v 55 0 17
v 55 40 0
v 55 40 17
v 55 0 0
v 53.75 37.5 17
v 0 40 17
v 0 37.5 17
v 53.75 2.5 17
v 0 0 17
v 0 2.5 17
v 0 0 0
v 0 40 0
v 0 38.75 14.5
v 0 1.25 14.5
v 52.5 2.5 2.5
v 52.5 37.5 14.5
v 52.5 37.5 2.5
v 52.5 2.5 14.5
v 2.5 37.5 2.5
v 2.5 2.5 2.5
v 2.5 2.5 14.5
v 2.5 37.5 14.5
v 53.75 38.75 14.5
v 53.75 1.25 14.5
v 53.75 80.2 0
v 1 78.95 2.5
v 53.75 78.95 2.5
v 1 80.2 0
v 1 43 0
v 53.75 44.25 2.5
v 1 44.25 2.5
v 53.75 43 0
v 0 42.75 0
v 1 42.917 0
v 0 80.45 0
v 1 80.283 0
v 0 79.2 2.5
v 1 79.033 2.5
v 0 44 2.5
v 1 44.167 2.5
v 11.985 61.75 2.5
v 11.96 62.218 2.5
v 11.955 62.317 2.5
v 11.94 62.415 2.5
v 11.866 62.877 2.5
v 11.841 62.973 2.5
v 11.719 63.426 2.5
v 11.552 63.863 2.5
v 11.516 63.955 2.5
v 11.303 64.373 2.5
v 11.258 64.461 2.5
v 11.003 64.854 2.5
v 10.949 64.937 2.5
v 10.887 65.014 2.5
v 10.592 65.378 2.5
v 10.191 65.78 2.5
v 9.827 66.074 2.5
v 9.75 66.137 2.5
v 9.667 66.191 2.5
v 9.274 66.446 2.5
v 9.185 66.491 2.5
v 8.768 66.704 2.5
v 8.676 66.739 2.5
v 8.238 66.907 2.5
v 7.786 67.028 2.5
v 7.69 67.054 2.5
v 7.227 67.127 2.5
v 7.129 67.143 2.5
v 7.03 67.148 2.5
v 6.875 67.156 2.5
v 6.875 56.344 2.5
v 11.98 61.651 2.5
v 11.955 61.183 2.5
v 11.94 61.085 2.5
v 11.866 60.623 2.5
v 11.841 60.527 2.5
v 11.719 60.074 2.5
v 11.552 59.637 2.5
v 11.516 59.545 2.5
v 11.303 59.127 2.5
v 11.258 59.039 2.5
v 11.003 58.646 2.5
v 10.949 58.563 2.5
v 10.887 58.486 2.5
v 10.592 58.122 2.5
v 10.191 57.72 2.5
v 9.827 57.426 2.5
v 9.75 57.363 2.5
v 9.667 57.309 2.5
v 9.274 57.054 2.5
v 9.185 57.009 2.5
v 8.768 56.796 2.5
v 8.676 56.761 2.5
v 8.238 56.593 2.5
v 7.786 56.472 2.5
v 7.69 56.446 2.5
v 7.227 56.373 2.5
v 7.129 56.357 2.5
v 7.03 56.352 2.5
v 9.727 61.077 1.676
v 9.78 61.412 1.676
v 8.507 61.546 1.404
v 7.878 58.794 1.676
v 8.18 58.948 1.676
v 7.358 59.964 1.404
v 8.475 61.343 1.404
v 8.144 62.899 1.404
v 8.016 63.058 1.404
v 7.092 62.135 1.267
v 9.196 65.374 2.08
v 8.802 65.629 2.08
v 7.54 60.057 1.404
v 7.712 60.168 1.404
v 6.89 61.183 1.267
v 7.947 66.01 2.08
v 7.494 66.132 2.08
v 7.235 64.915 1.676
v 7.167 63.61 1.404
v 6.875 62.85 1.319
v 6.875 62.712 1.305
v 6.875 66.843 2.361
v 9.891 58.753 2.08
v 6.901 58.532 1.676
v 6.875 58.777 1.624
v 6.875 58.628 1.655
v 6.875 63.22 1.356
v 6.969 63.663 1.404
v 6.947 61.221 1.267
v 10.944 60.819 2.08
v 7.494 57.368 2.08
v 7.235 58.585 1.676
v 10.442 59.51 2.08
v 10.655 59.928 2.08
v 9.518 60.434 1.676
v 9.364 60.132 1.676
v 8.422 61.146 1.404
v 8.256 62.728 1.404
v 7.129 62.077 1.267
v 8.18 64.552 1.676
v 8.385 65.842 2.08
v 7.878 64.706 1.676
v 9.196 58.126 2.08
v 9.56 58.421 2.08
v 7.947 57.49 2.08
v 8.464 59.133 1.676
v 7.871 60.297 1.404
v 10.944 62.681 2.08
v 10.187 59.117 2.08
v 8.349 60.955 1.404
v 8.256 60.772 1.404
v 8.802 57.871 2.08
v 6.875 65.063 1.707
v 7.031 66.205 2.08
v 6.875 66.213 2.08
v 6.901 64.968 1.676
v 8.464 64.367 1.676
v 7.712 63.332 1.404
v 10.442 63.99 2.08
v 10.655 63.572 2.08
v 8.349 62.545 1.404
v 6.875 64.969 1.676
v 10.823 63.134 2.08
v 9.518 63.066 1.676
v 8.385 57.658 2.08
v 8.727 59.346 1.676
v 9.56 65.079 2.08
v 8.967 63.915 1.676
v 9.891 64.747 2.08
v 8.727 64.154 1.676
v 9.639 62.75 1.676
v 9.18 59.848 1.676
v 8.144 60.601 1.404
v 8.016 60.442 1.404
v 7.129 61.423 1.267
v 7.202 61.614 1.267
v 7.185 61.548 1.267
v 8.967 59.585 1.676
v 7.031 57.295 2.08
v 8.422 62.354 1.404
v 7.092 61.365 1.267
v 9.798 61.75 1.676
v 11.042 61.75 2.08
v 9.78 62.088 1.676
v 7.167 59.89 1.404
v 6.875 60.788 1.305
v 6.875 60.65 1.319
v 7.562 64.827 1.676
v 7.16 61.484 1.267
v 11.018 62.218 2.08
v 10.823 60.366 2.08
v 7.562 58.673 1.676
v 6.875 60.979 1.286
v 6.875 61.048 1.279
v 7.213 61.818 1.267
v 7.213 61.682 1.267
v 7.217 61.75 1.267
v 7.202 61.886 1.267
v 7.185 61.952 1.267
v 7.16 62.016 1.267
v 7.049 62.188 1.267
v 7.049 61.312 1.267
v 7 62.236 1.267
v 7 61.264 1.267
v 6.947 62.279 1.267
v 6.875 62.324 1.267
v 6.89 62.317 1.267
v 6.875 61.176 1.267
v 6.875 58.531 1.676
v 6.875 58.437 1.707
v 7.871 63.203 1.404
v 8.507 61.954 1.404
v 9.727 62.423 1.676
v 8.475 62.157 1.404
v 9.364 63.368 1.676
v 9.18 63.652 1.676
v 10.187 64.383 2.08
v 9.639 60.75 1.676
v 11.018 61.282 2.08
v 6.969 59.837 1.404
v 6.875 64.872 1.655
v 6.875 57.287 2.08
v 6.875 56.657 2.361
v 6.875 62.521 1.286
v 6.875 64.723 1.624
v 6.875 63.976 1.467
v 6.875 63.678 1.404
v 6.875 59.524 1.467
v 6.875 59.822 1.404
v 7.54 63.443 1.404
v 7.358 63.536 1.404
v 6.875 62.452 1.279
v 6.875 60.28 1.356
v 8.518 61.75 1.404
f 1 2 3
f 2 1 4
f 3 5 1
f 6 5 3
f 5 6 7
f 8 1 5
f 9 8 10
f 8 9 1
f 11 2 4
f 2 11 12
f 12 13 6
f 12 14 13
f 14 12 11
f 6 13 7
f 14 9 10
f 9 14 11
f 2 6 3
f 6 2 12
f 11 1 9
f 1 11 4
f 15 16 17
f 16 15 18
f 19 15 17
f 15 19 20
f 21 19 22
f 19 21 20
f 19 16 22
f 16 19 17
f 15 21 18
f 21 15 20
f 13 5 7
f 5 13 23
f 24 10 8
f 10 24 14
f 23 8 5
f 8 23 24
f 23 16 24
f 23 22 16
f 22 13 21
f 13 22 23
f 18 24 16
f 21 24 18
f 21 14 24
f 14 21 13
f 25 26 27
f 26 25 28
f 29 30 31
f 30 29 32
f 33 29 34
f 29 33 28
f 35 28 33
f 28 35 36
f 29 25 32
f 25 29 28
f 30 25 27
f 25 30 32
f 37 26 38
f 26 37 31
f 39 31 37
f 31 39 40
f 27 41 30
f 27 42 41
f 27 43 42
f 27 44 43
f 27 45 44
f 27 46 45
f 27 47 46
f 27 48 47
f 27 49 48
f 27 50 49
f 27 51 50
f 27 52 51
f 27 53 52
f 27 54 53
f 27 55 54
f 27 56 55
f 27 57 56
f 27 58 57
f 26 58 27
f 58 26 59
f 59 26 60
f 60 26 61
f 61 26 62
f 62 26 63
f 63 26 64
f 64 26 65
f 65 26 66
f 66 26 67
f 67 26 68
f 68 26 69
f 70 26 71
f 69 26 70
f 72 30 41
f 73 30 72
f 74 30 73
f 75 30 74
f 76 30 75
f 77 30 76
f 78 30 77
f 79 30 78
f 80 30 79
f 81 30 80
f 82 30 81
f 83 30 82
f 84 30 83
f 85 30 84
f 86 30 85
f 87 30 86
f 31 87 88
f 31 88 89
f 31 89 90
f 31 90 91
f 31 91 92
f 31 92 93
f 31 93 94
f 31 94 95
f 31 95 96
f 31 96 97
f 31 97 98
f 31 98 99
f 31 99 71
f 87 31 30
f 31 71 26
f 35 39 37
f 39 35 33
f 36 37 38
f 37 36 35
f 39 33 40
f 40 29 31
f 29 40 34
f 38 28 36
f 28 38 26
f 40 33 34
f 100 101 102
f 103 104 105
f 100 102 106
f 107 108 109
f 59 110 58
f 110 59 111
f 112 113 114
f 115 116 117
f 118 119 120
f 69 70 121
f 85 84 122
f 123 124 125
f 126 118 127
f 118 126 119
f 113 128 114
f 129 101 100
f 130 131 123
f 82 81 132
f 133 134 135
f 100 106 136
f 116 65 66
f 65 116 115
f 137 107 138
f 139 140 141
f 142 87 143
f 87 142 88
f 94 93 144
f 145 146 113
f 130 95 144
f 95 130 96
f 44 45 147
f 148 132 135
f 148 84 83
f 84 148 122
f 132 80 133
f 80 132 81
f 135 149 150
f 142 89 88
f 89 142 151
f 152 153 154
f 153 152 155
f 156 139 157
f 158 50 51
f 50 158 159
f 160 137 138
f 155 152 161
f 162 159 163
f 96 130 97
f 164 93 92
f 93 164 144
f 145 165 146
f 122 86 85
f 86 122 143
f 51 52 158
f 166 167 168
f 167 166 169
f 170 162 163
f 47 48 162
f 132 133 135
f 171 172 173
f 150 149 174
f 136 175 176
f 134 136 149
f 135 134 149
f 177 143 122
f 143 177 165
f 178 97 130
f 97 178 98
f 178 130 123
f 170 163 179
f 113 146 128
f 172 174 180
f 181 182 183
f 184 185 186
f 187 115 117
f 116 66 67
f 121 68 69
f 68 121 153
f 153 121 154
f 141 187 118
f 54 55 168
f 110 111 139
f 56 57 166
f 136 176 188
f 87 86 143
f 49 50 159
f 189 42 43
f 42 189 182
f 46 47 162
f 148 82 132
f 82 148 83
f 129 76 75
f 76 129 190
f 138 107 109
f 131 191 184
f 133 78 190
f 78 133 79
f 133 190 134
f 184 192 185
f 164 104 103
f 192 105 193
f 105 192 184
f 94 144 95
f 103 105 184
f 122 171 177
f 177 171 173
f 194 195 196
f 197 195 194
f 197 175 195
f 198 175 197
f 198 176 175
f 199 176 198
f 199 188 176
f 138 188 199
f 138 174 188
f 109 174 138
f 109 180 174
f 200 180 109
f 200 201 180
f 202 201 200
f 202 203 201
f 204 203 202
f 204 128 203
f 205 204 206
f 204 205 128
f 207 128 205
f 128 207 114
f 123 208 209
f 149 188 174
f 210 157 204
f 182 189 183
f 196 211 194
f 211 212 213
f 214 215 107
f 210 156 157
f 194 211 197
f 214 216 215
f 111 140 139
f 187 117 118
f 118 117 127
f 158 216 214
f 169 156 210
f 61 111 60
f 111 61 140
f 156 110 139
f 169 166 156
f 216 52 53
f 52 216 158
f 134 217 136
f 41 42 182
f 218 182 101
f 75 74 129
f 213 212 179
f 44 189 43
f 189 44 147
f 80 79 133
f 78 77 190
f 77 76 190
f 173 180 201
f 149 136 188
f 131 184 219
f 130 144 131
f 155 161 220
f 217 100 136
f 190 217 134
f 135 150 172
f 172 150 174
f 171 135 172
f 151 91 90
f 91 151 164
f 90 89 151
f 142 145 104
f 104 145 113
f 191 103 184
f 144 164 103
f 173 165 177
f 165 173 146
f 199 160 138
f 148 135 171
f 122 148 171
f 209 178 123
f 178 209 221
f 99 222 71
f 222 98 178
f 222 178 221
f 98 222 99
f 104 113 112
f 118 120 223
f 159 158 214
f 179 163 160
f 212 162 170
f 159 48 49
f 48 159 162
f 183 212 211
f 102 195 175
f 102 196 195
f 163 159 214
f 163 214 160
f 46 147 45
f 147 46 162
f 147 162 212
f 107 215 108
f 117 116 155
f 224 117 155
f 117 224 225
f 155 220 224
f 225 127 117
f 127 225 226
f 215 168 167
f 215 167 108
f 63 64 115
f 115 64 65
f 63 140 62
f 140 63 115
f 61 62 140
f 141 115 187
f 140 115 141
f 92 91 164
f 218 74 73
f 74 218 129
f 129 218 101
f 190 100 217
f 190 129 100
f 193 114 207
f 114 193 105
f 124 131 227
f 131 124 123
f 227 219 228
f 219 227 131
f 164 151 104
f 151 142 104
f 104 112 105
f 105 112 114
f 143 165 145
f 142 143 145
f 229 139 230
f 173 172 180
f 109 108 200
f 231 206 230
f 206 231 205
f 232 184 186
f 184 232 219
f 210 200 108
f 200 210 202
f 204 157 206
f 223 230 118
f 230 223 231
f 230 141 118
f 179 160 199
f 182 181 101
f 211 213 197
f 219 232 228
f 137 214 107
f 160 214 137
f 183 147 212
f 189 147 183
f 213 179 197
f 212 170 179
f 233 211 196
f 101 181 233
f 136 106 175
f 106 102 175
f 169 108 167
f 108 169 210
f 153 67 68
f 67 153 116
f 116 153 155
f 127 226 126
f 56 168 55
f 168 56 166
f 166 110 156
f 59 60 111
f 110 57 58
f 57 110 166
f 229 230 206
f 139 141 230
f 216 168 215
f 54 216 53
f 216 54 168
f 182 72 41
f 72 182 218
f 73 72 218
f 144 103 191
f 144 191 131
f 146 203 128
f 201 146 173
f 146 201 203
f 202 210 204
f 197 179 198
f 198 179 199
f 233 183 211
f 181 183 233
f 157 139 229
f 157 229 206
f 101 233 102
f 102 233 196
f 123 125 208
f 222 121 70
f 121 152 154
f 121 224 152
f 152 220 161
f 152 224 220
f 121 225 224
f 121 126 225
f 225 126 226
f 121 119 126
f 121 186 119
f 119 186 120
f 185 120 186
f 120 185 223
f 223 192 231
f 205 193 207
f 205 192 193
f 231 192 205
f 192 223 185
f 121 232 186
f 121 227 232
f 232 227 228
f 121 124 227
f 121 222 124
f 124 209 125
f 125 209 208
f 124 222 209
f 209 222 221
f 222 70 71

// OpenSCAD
// Download both files into the same directory and make a copy of this template for each project. Adjust the variables and values as needed to override the defaults in this file as needed. In this way you can replace the `Ultimate_Box_Generator.scad` file with a new version without having to track and restore your changes.

// If you want to use any framework variables in calulations you must import them here. If you want to also change the variable you must use a second line below to do that.
wall=wall;
internal_wall=internal_wall;

// Include the framework. You can change the prefix to load from a shared path.
include    <Ultimate_Box_Generator.scad>;

// At this point you can start to adjust builtin varaibles and create your own. There are also some examples of more complex boxes at the end of the file.


// Parts to render. To do more complex opperations disable these and manually call make_box() and make_lid() instead.
show_box=true;	// Whether or not to render the box
show_lid=true;	// Whether or not to render the lid. To make open boxes with no lid set `show_lid=false` and `lid_type=5`.

// General Settings
//comp_size_deep = 12; // Depth of compartments
//comp_size_x = 50;	 // Size of compartments, X
//comp_size_y = 35;	 // Size of compartments, Y
//wall = 2.5;		    // Width of wall, see `internal_wall` below for alternate inner wall size.
//repeat_x = 1;		// Number of compartments, X
//repeat_y = 1;		// Number of compartments, Y
//tolerance=.15;      // Tolerance around lid.  If it's too tight, increase this. If it's too loose, decrease it.

// Box Rounding
//box_corner_radius=0; // Add a rounding affect to the corners of the box. Anything over `wall` will cause structure and lid problems.
//internal_corner_radius=0; // Add a rounding affect to the inside.
//mesh_corner_radius=0; // Leave a radius around each corner of the mesh. May hep with bridges.
//corner_fn=30;

// Supress individual walls.
//supress_walls_x=[]; // These are the walls running along the X axis. It should be an array of size [repeat_y-1][repeat_x].
//supress_walls_y=[]; // These are the walls running along the Y axis. It should be an array of size [repeat_x-1][repeat_y].
// Example for repeat_x=4, repeat_y=3:
//supress_walls_x=[[1,0,1,1],[0,1,0,1]];
//supress_walls_y=[[1,0,1],[0,1,1],[1,1,1]];
//supress_sides=false; // [X, Y, X, Y] Cutout/supress some sides. this may behave baddly with compartments or mesh.
//supress_sides_radius=wall; // Add a rounding to the cutout.
//supress_sides_offset=0; // 0, wall, [X, Y, Z] adjsut the coutout in all directions. + to grow, - so shrink
//supress_sides_fn=30;

// Mesh Settings
// To make rounded corners and no mesh use any `mesh_type` > 0 and set `strut_gap` to a high value.
// 0: No mesh, solid wall.
// 1: Single direction mesh.
// 2: Two direction cross mesh and 90 degree angle to eachother.
// 3: Two direction mesh but mirrored around 90 axsis instead or rotated 90 degrees.
// 4: Calculate angle across the diagonal of each opening. You will also want to change `strut_gap` to a large number and set `strut_count_min=1`.
// 5: No mesh, empty wall.
// 6: Honycomb. Also set `strut_width=wall/4` and `strut_gap=wall*2`. To big of a `strut_gap` may fail to print. Other shapes can be generated with `mesh_fn` and reducing `mesh_inset_padding` may help.
//mesh_type=0; // Mesh type, see above.
//mesh_rotation=0; // 0-90 degrees.
//mesh_alt_rotation=mesh_rotation; // Alternate rotation for top and bottom faces.
//mesh_do_sides=true; //[true, true, true, false] Include mesh on each side along axis. [X, Y, X, Y]
//mesh_do_bottom=false; // Include mesh on bottom plate.
//mesh_do_top=true; // Include mesh on top piece.
//mesh_do_interior=false; // Include mesh on inner walls.
//mesh_inset_padding=wall; // Leave some solid material before building strut frame. Anything less then wall/2 will likely fall apart.
//mesh_fn=mesh_type == 6 ? 6 : 40; // Complexity of curves in mesh's, increese for smoother curves.
//strut_width=wall*2; // Width of each strut, 0=hollow.
//strut_gap=wall; // Width of the air gap between each strut. 0=fine air gaps.
//strut_count_min=0; // Optinal minimum number of struts regardless of size calulations.
//alt_strut_width=strut_width; // Width of struts going the other directions.
//alt_strut_gap=strut_gap; // Width of gap going the other direction.
//alt_strut_count_min=strut_count_min; // Optinal minimum number of struts regardless of size calulations.
//mesh_overflow=0; // Extra rows to add to the mesh. For example in the Honeycomb partial hexegons will be created along the edges.

// Lid Settings
// 0: No Lid. top may be rounded and can cause other rendering changes.
// 1: Lid that slides off in the x direction.
// 2: Lid with a snapped in hinge that rotates open
// 3: Lid that snaps down onto the box. Also need to change lid_height to around 1.5mm.
// 4: Stackable version of cover 1 there boxes slide into one another. You will need one cover for the last box. (Not tested)
// 5: Oversized lid sits on top and has sides that extend down. (Needs snapp support)
//lid_type=1; // Lid type, see above.
//has_thumbhole=true; // Add gripping locations for easy opening.
//has_coinslot=false; // Add slot in the top for dropping in components.
//has_snap=true; // Add small ridges or snaps to lids to help keep them closed.
//coinslot_x=20;	// Size in X direction
//coinslot_y=2.5;	// Size in Y direction
//coinslot_corner_radius=0; // rounded coinslot corners if >0; best if less than half the shorter coinslot dimension
//z_tolerance=0;   // Z tolerance can be tweaked separately, to make the top of the sliding lid be flush with the top of the box itself.
//extra_bottom=.15; // Extra bottm wall height to fit type 4 slider.
//hinge_inset=.75; // Size of the hinge connection.
//snap_inset=.25; // Amount of overhang for snaps to snap into place.
//snap_tolerance=tolerance; // You may need to add tolerance around lid and snaps to let them move freely.
//lid_offset=3;		// This is how far away from the box to print the lid
//lid_height=wall*2;  // Height of lid. Must be greater than wall width for a `lid_type=5` lid to work. On Lid 3 is the depth of the inset snap.
//lid_fn=40; // Increese if printing thicker walls.
//lid_alt_offset=false; // Move lid in X instead of Y for printing.

//Internal Structure (You may need to turn off `mesh_do_sides` or `mesh_do_bottom` for good results.)
// You can also use `make_wall()` to manually add your own walls.
// 1: Rounded bottom frame.
// 2: Hexegon bottom frame. (To make this shape perfect set `comp_size_deep` to the width between to edges of the tile and set `comp_size_x` or `comp_size_y` to this this: `comp_size_deep / sqrt(3)*2`.
// 3: Rough bottom for make bits sit unevenly. (Partial)
// 4: Verical rounding on cordner. Set `internal_size_deep` to `comp_size_deep` and `internal_size_circle` to the shortest `comp_size` for a circle.
// 5: Vertical hexegon. Retulst may varry.
//internal_type=0; // Internal structure, see above.
//internal_rotate=false; // On lid axis or rotate to opposite.
//internal_size_deep=comp_size_deep/2; // How far into the box to start the internal structure. Should be `comp_size_deep/2` for type 1-2, `wall` for 3, or comp_size_deep for type 4-5.
//internal_size_circle=internal_type==1 ? internal_size_deep : internal_size_deep * 2 / sqrt(3); // Use this calculation, or the shorter comp_size for type 4-5.
//internal_fn=internal_type==1 || internal_type==4 ? 60 : 6; // Complexity of internal curves, may need to increase for larger or smoother curves.
//internal_wall=wall; // Custom size for internal walls.
//internal_wall_deep=comp_size_deep; // If set to lower then comp_size_deep then the internal walls will be this tall.

// Text Settings
// 0: None.
// 1: Cutout. Remove material formt he wall.
// 2: Raised. If a mesh is ued part of it is filled in to hold the text. Lids 0 and 3 are printed upside down by default. With this option used they will require supports regardless of the orrientation printed.
//text_type=0; // Text type, see above.
//text_depth=wall/6; // Distance to cutout text or raise it. User `wall` to cut through.
//text_size=5; // Font Size.
//text_font="Courier New:style=Bold"; // Use Hepl -> Font List to see options.
//text_message="Red Player"; // Message Text, or use `["Line 1", "Line 2"]` for multiline.
//text_message_compartments=false;//[["AA", "BB", "CC"], ["AB", "BC", "CD"]]; // Custom text for compartments in top or bottom. Also support multiline as `[[ ["A", "B"] ]]`.
//text_sides=true;//[true, true, true, false]; // Sides to put text on, [X, Y, X, Y]
//text_top=true; // Put Text on the top.
//text_bottom=false; // Put Text on the bottom.
//text_rotation=0; // Rotate the top and bottom text by X degrees. 90 will rotate from the X axis to the Y axis.
//text_offset=0; // Text is verticaly centered in the wall. This may look "off" due to casing or hanging tails. You can manually adjust the vertical alignment with this setting.
//text_fn=30; // Complexity of the letters, may need to increese with larger fonts.
//text_backdrop_scale=[.9, 1.5]; // Font size scaleing used on the backdrop when `text_type=2` is used on sides with a mesh.

// Complex Structure
//make_complex_box=false; // Use an array of objects from `complex_box` to create many smaller boxes within the larger box.
//internal_grow_down=true; // If set compartments will be extruded into the larger box from the top to make a flush surface. (May make a model that uses a lot of material.
//internal_empty_bottom=false; // If set the area blow each box will be empty. This will not be printable on a FDM printer unless supports are included internally but still may save material and print time.



// In addition you can set `show_box=false;` and then call `make_box()` manually to join and remove more structure to it like in this example.
/*show_box=false;
difference() {
    make_box();
    translate([0, comp_size_y/2 + wall, 0])
    rotate([0, 90, 0])
    cylinder(comp_size_x +wall*2, 10, 10);
}*/

// You can also use calls to `make_internal_box` to create more complex boxes within a larger box that share a single lid.
/*show_box=false;
make_box();
intersection() {     
    faction_x=10; faction_y=comp_size_y; faction_z=5; faction_repeat_x=3; faction_repeat_y=1;
    faction_size_x=calc_size(faction_repeat_x, faction_x, wall=internal_wall, internal_wall=internal_wall);
faction_size_y=calc_size(faction_repeat_y, faction_y, wall=internal_wall, internal_wall=internal_wall);
    
    translate([wall, wall, wall])
    cube([faction_size_x - wall, faction_size_y - wall*2, comp_size_deep]);
            
    translate([wall-internal_wall, wall-internal_wall, wall-internal_wall])
    union() {
        translate([0, 0, 0])
        make_internal_box(faction_x, faction_y, faction_z, wall=internal_wall, repeat_x=faction_repeat_x, repeat_y=faction_repeat_y);
    }
}*/

// This exmaple wil make a complex series of boxes in a larger container. The object's can be used to position other oebjects and create internal structure.
/*comp_size_x = 200;
comp_size_y = 200;
comp_size_deep = 200;

internal_wall=wall/2;

comp1=make_object(x=10, y=30, z=45, offset_x=0, offset_y=0, repeat_x=3, repeat_y=1, color="Red");
comp2=make_object(x=35, y=40, z=45, offset_x=comp1[4][0], offset_y=0, repeat_x=1, repeat_y=1, color="Pink");
comp3=make_object(x=35, y=30, z=45, offset_x=comp2[4][0], offset_y=0, repeat_x=1, repeat_y=1, color="Orange");
comp4=make_object(x=150, y=100, z=75, offset_x=0, offset_y=comp1[4][1], repeat_x=1, repeat_y=1, color="Blue");

complex_box=[
    comp1, comp2, comp3, comp4,
    
];
make_complex_box=true;*/

// Some notes on complex prints:
/* OpenSCAD expereicne is required to do pretty much any type of customization or complex opperations. This will essentaily jsut make the containers within one larger object with a single lid. Alternatly multiple boxes could be reated and then joined together with translations to make a larger object with multiple lids. 
   Due to how variables are passed in OpenSCAD it can be tricky to get the parameters set on the parent box and child boxes as you want. It is best to use global variable assignmets to set the child box parameters, then pass overrides to the `make_box()` call yourself. (You have to also set `show_box=false;` if you ddo this.)
  */
